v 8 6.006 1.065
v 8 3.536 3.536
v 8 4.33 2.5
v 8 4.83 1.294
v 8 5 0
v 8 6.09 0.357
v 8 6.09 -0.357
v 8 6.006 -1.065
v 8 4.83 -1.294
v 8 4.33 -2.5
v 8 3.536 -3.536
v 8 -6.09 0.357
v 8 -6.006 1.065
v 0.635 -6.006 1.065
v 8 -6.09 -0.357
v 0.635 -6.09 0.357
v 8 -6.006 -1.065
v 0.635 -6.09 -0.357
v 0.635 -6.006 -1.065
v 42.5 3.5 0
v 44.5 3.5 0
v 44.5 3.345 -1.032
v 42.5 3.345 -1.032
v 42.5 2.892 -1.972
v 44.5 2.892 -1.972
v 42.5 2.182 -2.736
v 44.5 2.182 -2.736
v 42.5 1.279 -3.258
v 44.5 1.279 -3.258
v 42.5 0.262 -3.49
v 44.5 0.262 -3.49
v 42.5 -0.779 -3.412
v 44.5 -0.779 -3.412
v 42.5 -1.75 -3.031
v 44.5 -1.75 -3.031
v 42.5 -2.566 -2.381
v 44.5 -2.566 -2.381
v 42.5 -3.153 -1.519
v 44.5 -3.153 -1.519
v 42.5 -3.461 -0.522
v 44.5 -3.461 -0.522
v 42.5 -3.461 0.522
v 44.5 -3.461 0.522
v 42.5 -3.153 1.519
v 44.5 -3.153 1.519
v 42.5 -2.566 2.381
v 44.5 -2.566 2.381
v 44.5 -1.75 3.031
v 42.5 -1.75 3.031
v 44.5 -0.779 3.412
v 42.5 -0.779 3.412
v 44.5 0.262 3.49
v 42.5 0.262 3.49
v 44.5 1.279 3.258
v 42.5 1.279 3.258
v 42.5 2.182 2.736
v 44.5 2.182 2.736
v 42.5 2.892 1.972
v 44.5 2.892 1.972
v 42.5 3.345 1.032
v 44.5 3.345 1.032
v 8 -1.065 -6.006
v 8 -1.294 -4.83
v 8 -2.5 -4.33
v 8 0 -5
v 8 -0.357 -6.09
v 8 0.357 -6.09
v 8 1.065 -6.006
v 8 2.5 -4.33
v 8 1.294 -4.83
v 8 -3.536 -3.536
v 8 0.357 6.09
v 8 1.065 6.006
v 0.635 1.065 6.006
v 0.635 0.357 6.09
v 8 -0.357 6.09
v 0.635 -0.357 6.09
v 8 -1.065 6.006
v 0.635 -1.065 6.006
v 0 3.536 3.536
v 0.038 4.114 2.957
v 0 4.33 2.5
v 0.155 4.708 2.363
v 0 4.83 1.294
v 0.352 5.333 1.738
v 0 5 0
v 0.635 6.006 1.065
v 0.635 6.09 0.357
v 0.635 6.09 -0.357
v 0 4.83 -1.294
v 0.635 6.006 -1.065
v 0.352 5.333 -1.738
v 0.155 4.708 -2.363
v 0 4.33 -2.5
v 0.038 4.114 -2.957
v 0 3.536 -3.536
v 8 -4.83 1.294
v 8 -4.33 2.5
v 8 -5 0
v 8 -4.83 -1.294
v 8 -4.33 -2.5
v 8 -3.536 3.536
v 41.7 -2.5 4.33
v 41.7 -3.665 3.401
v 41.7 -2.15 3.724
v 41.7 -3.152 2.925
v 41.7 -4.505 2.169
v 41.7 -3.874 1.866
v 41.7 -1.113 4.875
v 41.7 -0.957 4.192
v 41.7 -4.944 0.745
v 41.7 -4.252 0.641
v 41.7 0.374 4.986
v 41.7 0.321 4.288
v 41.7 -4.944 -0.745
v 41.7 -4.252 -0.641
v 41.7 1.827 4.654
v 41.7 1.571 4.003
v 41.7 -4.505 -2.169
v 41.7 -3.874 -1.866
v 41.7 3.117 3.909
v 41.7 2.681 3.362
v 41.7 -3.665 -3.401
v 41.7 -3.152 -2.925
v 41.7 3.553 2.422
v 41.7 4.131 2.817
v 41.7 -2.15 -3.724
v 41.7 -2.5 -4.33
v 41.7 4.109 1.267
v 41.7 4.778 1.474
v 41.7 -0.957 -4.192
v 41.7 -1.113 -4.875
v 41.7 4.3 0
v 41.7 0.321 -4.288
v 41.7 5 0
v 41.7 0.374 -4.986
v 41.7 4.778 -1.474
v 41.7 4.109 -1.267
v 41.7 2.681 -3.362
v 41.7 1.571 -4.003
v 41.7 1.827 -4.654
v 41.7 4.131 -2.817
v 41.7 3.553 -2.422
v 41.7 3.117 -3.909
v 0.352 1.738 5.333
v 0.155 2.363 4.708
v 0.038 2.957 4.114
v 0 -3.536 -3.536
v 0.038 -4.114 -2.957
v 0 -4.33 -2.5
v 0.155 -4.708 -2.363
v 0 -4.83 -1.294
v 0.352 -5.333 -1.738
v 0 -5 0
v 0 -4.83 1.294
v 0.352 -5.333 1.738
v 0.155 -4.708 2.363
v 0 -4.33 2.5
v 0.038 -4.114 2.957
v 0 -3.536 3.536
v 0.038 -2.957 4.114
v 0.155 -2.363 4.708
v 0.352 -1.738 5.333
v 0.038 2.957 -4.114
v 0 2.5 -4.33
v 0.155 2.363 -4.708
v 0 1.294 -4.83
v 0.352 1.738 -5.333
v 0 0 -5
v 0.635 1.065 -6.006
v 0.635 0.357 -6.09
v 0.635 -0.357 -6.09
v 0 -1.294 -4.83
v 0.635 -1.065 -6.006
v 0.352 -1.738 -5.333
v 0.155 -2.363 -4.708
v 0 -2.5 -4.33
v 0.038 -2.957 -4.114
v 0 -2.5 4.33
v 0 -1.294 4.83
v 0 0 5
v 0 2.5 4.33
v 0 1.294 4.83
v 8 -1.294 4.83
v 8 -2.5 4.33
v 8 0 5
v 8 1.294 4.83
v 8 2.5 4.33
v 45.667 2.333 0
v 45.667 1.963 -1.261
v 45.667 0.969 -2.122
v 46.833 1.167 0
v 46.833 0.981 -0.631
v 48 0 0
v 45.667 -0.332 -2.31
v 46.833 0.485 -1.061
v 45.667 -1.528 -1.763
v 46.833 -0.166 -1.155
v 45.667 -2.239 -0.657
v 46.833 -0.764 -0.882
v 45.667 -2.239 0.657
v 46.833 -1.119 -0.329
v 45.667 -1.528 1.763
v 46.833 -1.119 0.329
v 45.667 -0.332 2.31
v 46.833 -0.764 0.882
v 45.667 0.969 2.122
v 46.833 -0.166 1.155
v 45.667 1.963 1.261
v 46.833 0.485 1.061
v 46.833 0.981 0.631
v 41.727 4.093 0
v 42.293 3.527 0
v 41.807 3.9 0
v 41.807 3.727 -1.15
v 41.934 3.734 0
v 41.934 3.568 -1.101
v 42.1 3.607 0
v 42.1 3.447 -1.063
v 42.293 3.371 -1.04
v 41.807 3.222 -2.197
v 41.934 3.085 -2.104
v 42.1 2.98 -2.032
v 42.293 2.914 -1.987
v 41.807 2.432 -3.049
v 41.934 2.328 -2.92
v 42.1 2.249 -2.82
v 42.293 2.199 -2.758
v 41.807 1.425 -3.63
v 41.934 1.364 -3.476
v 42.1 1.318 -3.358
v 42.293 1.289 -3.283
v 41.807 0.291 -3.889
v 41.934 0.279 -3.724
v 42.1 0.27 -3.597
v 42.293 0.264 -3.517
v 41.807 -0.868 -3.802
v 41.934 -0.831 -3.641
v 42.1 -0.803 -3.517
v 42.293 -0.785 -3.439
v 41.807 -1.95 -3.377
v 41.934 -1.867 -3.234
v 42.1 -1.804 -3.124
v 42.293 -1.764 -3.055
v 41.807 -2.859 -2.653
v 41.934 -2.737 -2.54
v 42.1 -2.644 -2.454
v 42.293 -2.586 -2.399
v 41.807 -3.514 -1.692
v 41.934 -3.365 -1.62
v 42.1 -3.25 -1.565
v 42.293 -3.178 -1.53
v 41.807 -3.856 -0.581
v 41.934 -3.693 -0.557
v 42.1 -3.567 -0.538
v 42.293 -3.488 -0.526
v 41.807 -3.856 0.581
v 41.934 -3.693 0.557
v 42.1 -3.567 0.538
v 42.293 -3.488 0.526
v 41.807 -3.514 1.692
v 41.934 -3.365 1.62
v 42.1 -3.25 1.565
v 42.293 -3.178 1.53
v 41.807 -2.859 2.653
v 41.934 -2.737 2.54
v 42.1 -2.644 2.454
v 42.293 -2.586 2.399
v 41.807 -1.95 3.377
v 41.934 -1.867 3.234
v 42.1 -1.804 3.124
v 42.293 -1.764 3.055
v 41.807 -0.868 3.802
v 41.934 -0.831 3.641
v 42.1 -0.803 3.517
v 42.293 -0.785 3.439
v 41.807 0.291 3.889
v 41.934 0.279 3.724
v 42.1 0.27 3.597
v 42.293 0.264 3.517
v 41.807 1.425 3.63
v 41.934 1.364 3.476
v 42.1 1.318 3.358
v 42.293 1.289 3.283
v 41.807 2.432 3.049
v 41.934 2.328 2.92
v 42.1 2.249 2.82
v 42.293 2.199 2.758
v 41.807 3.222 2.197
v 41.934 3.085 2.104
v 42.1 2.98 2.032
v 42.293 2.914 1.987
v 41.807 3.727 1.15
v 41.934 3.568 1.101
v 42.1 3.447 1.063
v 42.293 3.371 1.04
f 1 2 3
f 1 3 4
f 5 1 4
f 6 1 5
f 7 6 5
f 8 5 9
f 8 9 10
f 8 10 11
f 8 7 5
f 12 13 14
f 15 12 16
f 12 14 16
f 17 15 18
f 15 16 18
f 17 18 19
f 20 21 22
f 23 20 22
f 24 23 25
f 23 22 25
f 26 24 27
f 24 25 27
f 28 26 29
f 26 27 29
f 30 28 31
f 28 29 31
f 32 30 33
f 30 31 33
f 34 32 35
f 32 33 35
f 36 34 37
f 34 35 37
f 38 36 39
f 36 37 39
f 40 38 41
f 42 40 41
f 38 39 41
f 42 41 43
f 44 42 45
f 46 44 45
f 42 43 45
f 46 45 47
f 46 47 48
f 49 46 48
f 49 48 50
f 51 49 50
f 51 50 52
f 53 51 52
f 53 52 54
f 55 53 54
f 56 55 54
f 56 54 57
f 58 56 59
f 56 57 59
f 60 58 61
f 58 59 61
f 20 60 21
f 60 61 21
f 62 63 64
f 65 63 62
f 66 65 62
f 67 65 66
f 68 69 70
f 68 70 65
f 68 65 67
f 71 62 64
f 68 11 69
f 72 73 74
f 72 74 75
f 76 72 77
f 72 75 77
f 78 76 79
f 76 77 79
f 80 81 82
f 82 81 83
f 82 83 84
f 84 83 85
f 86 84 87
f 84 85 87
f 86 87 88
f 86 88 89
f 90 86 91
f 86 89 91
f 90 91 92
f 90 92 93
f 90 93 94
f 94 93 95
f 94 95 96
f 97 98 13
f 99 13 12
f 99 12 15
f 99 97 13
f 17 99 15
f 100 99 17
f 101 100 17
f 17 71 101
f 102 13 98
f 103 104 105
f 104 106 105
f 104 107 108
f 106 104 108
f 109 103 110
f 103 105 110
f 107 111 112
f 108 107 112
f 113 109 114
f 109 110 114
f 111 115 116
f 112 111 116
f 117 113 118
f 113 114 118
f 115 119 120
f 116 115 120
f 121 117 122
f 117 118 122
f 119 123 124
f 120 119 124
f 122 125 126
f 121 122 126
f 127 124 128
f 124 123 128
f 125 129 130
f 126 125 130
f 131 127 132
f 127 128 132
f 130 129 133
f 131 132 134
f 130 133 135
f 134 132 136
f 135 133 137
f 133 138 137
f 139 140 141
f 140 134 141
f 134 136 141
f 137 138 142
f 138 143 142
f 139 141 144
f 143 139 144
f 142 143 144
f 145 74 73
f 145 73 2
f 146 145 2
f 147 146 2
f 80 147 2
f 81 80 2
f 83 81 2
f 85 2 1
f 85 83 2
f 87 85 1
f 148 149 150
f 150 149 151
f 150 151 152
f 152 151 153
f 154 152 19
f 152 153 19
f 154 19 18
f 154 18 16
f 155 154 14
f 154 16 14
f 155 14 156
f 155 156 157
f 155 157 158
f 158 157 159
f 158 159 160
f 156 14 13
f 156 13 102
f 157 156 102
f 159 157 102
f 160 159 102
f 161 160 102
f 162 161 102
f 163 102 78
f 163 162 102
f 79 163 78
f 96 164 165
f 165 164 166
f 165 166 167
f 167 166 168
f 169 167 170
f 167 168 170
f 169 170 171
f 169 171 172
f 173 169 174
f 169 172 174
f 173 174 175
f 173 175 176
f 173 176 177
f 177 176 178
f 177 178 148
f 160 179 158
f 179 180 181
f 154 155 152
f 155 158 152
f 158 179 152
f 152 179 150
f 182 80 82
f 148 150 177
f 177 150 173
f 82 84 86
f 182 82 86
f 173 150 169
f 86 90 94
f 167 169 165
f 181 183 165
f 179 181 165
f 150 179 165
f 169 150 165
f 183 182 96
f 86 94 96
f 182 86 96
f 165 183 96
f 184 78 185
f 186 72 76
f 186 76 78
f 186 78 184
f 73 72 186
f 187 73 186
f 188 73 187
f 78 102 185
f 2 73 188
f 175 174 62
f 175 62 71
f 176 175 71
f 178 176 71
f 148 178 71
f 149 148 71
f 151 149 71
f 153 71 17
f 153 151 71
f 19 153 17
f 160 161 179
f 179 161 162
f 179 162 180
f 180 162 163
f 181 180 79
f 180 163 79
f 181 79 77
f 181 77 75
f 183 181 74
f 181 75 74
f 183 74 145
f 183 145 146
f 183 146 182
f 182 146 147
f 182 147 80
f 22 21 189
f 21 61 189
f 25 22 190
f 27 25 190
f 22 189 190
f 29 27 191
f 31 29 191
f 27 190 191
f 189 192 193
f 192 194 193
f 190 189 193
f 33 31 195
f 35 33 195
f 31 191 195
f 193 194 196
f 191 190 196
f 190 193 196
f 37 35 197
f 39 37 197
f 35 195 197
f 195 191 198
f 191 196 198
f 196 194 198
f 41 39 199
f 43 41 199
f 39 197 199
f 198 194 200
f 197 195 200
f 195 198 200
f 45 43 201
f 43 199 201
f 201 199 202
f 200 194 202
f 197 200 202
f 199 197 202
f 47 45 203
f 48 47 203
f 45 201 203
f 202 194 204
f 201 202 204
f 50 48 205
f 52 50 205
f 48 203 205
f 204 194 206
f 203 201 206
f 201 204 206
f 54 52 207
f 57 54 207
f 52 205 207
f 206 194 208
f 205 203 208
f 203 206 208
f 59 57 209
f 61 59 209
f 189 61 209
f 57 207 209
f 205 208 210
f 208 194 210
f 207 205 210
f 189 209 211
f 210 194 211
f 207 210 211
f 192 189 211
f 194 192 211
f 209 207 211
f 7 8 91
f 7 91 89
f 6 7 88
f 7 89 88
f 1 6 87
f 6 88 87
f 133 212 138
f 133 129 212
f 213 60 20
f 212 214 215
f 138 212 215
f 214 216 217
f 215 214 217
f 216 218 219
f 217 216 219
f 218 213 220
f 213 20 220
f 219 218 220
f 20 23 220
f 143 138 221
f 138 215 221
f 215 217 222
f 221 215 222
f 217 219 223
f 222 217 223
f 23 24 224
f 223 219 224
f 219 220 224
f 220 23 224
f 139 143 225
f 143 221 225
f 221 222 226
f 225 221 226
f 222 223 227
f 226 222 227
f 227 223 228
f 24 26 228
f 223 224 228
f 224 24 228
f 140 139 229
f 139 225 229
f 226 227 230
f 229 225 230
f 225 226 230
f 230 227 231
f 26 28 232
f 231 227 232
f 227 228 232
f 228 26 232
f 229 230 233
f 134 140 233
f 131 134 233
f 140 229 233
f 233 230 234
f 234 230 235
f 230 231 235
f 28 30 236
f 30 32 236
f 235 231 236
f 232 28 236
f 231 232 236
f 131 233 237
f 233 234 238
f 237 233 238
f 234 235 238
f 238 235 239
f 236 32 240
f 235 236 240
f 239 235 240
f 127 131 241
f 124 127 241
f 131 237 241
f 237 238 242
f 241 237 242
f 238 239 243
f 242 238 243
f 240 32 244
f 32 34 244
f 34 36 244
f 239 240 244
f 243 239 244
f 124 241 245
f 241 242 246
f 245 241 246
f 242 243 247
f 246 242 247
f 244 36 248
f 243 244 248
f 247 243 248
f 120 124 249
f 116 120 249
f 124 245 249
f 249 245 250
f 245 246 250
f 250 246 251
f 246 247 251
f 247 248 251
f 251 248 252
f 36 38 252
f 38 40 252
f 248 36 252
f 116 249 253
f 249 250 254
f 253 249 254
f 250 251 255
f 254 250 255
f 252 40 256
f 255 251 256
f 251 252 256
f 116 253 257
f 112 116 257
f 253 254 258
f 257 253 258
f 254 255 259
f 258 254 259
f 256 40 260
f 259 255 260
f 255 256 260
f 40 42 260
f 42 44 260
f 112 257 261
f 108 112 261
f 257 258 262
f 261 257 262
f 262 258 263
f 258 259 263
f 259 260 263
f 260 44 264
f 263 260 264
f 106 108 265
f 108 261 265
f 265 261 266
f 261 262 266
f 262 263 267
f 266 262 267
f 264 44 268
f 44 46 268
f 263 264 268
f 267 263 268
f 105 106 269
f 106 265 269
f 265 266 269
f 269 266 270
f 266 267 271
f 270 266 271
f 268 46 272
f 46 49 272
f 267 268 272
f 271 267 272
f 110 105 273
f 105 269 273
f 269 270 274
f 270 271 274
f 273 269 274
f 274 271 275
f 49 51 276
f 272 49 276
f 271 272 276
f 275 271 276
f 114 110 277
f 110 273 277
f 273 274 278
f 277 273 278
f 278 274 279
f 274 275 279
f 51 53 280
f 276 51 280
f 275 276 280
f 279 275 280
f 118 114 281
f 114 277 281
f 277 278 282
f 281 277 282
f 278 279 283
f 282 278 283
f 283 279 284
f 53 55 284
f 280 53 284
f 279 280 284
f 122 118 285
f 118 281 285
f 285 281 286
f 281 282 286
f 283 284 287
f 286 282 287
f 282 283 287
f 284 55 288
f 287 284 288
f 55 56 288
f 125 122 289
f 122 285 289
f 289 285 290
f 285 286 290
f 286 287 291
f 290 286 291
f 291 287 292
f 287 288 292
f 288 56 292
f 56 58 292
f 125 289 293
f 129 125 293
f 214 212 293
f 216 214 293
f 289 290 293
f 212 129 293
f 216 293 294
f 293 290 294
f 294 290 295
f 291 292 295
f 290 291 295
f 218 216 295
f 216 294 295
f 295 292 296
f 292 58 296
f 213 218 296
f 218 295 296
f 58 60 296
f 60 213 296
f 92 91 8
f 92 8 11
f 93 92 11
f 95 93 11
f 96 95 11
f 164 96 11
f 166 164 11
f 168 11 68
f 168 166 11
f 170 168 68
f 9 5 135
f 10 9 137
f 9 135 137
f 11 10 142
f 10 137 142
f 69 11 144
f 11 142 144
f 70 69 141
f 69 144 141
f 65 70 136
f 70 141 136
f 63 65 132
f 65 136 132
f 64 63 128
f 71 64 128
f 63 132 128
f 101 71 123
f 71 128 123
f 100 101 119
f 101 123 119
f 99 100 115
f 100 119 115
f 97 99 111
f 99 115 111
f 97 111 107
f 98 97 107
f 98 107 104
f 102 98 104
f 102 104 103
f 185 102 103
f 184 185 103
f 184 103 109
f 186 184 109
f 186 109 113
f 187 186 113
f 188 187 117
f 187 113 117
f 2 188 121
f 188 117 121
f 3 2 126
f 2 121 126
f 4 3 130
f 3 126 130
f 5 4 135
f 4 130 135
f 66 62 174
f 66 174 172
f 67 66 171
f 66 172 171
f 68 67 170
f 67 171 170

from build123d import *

# Parameters (mm, degrees)
SKETCH1_R          = 6.1
BASEHEAD_DEPTH     = 8
SKETCH2_OUTSIDE_W  = 18.004
SKETCH2_OUTSIDE_H  = 18.004
CUT_EXTRUDE1_DEPTH = 8
FILLET1_R          = 0.8


with BuildPart() as part:
    # Sketch1 → BaseHead (new body)
    with BuildSketch(Plane(origin=(0, 0, 0), x_dir=(0, 0, -1), z_dir=(1, 0, 0))):
        Circle(SKETCH1_R)
    extrude(amount=BASEHEAD_DEPTH)

    # Sketch2 outside → Cut-Extrude1 (cut)
    with BuildSketch(Plane(origin=(0, 2.662946325, -1.492108674), x_dir=(0, 0, 1), z_dir=(-1, 0, 0))):
        with Locations((1.492, -2.663)):
            Rectangle(SKETCH2_OUTSIDE_W, SKETCH2_OUTSIDE_H)
        Polygon((8.563176486, -2.662946325), (1.492108674, 4.408121487), (-5.578959138, -2.662946325), (1.492108674, -9.734014137), align=None, mode=Mode.SUBTRACT)
    extrude(amount=-CUT_EXTRUDE1_DEPTH, mode=Mode.SUBTRACT)

    # Sketch3 → Cut-Revolve1 (revolve, cut)
    with BuildSketch(Plane(origin=(1.259716749, -5.274716749, 0), x_dir=(0, -1, 0), z_dir=(0, 0, 1))):
        Polygon((-11.984716749, -1.259716749), (-10.274716749, -1.259716749), (-11.984716749, -0.272447788), align=None)
    revolve(axis=Axis((1.545283251, 0, 0), (-1, 0, 0)), mode=Mode.SUBTRACT)

    # Sketch4 → BaseBody (revolve)
    with BuildSketch(Plane(origin=(-10.34721472, 12.84721472, 0), x_dir=(0, -1, 0), z_dir=(0, 0, 1)), mode=Mode.PRIVATE) as basebody_sk:
        Polygon((12.84721472, 18.34721472), (17.84721472, 18.34721472), (17.84721472, 52.04721472), (16.34721472, 52.04721472), (16.34721472, 54.84721472), (12.84721472, 58.34721472), align=None)
    revolve(basebody_sk.sketch.rotate(Axis((14.086803097, 0, 0), (-1, 0, 0)), 180), axis=Axis((14.086803097, 0, 0), (-1, 0, 0)))

    # Fillet1
    fillet1_edges = [part.edges().sort_by_distance(p)[0] for p in [
        (41.7, -3.5, 0),
    ]]
    fillet(fillet1_edges, radius=FILLET1_R)


solid = part.part
